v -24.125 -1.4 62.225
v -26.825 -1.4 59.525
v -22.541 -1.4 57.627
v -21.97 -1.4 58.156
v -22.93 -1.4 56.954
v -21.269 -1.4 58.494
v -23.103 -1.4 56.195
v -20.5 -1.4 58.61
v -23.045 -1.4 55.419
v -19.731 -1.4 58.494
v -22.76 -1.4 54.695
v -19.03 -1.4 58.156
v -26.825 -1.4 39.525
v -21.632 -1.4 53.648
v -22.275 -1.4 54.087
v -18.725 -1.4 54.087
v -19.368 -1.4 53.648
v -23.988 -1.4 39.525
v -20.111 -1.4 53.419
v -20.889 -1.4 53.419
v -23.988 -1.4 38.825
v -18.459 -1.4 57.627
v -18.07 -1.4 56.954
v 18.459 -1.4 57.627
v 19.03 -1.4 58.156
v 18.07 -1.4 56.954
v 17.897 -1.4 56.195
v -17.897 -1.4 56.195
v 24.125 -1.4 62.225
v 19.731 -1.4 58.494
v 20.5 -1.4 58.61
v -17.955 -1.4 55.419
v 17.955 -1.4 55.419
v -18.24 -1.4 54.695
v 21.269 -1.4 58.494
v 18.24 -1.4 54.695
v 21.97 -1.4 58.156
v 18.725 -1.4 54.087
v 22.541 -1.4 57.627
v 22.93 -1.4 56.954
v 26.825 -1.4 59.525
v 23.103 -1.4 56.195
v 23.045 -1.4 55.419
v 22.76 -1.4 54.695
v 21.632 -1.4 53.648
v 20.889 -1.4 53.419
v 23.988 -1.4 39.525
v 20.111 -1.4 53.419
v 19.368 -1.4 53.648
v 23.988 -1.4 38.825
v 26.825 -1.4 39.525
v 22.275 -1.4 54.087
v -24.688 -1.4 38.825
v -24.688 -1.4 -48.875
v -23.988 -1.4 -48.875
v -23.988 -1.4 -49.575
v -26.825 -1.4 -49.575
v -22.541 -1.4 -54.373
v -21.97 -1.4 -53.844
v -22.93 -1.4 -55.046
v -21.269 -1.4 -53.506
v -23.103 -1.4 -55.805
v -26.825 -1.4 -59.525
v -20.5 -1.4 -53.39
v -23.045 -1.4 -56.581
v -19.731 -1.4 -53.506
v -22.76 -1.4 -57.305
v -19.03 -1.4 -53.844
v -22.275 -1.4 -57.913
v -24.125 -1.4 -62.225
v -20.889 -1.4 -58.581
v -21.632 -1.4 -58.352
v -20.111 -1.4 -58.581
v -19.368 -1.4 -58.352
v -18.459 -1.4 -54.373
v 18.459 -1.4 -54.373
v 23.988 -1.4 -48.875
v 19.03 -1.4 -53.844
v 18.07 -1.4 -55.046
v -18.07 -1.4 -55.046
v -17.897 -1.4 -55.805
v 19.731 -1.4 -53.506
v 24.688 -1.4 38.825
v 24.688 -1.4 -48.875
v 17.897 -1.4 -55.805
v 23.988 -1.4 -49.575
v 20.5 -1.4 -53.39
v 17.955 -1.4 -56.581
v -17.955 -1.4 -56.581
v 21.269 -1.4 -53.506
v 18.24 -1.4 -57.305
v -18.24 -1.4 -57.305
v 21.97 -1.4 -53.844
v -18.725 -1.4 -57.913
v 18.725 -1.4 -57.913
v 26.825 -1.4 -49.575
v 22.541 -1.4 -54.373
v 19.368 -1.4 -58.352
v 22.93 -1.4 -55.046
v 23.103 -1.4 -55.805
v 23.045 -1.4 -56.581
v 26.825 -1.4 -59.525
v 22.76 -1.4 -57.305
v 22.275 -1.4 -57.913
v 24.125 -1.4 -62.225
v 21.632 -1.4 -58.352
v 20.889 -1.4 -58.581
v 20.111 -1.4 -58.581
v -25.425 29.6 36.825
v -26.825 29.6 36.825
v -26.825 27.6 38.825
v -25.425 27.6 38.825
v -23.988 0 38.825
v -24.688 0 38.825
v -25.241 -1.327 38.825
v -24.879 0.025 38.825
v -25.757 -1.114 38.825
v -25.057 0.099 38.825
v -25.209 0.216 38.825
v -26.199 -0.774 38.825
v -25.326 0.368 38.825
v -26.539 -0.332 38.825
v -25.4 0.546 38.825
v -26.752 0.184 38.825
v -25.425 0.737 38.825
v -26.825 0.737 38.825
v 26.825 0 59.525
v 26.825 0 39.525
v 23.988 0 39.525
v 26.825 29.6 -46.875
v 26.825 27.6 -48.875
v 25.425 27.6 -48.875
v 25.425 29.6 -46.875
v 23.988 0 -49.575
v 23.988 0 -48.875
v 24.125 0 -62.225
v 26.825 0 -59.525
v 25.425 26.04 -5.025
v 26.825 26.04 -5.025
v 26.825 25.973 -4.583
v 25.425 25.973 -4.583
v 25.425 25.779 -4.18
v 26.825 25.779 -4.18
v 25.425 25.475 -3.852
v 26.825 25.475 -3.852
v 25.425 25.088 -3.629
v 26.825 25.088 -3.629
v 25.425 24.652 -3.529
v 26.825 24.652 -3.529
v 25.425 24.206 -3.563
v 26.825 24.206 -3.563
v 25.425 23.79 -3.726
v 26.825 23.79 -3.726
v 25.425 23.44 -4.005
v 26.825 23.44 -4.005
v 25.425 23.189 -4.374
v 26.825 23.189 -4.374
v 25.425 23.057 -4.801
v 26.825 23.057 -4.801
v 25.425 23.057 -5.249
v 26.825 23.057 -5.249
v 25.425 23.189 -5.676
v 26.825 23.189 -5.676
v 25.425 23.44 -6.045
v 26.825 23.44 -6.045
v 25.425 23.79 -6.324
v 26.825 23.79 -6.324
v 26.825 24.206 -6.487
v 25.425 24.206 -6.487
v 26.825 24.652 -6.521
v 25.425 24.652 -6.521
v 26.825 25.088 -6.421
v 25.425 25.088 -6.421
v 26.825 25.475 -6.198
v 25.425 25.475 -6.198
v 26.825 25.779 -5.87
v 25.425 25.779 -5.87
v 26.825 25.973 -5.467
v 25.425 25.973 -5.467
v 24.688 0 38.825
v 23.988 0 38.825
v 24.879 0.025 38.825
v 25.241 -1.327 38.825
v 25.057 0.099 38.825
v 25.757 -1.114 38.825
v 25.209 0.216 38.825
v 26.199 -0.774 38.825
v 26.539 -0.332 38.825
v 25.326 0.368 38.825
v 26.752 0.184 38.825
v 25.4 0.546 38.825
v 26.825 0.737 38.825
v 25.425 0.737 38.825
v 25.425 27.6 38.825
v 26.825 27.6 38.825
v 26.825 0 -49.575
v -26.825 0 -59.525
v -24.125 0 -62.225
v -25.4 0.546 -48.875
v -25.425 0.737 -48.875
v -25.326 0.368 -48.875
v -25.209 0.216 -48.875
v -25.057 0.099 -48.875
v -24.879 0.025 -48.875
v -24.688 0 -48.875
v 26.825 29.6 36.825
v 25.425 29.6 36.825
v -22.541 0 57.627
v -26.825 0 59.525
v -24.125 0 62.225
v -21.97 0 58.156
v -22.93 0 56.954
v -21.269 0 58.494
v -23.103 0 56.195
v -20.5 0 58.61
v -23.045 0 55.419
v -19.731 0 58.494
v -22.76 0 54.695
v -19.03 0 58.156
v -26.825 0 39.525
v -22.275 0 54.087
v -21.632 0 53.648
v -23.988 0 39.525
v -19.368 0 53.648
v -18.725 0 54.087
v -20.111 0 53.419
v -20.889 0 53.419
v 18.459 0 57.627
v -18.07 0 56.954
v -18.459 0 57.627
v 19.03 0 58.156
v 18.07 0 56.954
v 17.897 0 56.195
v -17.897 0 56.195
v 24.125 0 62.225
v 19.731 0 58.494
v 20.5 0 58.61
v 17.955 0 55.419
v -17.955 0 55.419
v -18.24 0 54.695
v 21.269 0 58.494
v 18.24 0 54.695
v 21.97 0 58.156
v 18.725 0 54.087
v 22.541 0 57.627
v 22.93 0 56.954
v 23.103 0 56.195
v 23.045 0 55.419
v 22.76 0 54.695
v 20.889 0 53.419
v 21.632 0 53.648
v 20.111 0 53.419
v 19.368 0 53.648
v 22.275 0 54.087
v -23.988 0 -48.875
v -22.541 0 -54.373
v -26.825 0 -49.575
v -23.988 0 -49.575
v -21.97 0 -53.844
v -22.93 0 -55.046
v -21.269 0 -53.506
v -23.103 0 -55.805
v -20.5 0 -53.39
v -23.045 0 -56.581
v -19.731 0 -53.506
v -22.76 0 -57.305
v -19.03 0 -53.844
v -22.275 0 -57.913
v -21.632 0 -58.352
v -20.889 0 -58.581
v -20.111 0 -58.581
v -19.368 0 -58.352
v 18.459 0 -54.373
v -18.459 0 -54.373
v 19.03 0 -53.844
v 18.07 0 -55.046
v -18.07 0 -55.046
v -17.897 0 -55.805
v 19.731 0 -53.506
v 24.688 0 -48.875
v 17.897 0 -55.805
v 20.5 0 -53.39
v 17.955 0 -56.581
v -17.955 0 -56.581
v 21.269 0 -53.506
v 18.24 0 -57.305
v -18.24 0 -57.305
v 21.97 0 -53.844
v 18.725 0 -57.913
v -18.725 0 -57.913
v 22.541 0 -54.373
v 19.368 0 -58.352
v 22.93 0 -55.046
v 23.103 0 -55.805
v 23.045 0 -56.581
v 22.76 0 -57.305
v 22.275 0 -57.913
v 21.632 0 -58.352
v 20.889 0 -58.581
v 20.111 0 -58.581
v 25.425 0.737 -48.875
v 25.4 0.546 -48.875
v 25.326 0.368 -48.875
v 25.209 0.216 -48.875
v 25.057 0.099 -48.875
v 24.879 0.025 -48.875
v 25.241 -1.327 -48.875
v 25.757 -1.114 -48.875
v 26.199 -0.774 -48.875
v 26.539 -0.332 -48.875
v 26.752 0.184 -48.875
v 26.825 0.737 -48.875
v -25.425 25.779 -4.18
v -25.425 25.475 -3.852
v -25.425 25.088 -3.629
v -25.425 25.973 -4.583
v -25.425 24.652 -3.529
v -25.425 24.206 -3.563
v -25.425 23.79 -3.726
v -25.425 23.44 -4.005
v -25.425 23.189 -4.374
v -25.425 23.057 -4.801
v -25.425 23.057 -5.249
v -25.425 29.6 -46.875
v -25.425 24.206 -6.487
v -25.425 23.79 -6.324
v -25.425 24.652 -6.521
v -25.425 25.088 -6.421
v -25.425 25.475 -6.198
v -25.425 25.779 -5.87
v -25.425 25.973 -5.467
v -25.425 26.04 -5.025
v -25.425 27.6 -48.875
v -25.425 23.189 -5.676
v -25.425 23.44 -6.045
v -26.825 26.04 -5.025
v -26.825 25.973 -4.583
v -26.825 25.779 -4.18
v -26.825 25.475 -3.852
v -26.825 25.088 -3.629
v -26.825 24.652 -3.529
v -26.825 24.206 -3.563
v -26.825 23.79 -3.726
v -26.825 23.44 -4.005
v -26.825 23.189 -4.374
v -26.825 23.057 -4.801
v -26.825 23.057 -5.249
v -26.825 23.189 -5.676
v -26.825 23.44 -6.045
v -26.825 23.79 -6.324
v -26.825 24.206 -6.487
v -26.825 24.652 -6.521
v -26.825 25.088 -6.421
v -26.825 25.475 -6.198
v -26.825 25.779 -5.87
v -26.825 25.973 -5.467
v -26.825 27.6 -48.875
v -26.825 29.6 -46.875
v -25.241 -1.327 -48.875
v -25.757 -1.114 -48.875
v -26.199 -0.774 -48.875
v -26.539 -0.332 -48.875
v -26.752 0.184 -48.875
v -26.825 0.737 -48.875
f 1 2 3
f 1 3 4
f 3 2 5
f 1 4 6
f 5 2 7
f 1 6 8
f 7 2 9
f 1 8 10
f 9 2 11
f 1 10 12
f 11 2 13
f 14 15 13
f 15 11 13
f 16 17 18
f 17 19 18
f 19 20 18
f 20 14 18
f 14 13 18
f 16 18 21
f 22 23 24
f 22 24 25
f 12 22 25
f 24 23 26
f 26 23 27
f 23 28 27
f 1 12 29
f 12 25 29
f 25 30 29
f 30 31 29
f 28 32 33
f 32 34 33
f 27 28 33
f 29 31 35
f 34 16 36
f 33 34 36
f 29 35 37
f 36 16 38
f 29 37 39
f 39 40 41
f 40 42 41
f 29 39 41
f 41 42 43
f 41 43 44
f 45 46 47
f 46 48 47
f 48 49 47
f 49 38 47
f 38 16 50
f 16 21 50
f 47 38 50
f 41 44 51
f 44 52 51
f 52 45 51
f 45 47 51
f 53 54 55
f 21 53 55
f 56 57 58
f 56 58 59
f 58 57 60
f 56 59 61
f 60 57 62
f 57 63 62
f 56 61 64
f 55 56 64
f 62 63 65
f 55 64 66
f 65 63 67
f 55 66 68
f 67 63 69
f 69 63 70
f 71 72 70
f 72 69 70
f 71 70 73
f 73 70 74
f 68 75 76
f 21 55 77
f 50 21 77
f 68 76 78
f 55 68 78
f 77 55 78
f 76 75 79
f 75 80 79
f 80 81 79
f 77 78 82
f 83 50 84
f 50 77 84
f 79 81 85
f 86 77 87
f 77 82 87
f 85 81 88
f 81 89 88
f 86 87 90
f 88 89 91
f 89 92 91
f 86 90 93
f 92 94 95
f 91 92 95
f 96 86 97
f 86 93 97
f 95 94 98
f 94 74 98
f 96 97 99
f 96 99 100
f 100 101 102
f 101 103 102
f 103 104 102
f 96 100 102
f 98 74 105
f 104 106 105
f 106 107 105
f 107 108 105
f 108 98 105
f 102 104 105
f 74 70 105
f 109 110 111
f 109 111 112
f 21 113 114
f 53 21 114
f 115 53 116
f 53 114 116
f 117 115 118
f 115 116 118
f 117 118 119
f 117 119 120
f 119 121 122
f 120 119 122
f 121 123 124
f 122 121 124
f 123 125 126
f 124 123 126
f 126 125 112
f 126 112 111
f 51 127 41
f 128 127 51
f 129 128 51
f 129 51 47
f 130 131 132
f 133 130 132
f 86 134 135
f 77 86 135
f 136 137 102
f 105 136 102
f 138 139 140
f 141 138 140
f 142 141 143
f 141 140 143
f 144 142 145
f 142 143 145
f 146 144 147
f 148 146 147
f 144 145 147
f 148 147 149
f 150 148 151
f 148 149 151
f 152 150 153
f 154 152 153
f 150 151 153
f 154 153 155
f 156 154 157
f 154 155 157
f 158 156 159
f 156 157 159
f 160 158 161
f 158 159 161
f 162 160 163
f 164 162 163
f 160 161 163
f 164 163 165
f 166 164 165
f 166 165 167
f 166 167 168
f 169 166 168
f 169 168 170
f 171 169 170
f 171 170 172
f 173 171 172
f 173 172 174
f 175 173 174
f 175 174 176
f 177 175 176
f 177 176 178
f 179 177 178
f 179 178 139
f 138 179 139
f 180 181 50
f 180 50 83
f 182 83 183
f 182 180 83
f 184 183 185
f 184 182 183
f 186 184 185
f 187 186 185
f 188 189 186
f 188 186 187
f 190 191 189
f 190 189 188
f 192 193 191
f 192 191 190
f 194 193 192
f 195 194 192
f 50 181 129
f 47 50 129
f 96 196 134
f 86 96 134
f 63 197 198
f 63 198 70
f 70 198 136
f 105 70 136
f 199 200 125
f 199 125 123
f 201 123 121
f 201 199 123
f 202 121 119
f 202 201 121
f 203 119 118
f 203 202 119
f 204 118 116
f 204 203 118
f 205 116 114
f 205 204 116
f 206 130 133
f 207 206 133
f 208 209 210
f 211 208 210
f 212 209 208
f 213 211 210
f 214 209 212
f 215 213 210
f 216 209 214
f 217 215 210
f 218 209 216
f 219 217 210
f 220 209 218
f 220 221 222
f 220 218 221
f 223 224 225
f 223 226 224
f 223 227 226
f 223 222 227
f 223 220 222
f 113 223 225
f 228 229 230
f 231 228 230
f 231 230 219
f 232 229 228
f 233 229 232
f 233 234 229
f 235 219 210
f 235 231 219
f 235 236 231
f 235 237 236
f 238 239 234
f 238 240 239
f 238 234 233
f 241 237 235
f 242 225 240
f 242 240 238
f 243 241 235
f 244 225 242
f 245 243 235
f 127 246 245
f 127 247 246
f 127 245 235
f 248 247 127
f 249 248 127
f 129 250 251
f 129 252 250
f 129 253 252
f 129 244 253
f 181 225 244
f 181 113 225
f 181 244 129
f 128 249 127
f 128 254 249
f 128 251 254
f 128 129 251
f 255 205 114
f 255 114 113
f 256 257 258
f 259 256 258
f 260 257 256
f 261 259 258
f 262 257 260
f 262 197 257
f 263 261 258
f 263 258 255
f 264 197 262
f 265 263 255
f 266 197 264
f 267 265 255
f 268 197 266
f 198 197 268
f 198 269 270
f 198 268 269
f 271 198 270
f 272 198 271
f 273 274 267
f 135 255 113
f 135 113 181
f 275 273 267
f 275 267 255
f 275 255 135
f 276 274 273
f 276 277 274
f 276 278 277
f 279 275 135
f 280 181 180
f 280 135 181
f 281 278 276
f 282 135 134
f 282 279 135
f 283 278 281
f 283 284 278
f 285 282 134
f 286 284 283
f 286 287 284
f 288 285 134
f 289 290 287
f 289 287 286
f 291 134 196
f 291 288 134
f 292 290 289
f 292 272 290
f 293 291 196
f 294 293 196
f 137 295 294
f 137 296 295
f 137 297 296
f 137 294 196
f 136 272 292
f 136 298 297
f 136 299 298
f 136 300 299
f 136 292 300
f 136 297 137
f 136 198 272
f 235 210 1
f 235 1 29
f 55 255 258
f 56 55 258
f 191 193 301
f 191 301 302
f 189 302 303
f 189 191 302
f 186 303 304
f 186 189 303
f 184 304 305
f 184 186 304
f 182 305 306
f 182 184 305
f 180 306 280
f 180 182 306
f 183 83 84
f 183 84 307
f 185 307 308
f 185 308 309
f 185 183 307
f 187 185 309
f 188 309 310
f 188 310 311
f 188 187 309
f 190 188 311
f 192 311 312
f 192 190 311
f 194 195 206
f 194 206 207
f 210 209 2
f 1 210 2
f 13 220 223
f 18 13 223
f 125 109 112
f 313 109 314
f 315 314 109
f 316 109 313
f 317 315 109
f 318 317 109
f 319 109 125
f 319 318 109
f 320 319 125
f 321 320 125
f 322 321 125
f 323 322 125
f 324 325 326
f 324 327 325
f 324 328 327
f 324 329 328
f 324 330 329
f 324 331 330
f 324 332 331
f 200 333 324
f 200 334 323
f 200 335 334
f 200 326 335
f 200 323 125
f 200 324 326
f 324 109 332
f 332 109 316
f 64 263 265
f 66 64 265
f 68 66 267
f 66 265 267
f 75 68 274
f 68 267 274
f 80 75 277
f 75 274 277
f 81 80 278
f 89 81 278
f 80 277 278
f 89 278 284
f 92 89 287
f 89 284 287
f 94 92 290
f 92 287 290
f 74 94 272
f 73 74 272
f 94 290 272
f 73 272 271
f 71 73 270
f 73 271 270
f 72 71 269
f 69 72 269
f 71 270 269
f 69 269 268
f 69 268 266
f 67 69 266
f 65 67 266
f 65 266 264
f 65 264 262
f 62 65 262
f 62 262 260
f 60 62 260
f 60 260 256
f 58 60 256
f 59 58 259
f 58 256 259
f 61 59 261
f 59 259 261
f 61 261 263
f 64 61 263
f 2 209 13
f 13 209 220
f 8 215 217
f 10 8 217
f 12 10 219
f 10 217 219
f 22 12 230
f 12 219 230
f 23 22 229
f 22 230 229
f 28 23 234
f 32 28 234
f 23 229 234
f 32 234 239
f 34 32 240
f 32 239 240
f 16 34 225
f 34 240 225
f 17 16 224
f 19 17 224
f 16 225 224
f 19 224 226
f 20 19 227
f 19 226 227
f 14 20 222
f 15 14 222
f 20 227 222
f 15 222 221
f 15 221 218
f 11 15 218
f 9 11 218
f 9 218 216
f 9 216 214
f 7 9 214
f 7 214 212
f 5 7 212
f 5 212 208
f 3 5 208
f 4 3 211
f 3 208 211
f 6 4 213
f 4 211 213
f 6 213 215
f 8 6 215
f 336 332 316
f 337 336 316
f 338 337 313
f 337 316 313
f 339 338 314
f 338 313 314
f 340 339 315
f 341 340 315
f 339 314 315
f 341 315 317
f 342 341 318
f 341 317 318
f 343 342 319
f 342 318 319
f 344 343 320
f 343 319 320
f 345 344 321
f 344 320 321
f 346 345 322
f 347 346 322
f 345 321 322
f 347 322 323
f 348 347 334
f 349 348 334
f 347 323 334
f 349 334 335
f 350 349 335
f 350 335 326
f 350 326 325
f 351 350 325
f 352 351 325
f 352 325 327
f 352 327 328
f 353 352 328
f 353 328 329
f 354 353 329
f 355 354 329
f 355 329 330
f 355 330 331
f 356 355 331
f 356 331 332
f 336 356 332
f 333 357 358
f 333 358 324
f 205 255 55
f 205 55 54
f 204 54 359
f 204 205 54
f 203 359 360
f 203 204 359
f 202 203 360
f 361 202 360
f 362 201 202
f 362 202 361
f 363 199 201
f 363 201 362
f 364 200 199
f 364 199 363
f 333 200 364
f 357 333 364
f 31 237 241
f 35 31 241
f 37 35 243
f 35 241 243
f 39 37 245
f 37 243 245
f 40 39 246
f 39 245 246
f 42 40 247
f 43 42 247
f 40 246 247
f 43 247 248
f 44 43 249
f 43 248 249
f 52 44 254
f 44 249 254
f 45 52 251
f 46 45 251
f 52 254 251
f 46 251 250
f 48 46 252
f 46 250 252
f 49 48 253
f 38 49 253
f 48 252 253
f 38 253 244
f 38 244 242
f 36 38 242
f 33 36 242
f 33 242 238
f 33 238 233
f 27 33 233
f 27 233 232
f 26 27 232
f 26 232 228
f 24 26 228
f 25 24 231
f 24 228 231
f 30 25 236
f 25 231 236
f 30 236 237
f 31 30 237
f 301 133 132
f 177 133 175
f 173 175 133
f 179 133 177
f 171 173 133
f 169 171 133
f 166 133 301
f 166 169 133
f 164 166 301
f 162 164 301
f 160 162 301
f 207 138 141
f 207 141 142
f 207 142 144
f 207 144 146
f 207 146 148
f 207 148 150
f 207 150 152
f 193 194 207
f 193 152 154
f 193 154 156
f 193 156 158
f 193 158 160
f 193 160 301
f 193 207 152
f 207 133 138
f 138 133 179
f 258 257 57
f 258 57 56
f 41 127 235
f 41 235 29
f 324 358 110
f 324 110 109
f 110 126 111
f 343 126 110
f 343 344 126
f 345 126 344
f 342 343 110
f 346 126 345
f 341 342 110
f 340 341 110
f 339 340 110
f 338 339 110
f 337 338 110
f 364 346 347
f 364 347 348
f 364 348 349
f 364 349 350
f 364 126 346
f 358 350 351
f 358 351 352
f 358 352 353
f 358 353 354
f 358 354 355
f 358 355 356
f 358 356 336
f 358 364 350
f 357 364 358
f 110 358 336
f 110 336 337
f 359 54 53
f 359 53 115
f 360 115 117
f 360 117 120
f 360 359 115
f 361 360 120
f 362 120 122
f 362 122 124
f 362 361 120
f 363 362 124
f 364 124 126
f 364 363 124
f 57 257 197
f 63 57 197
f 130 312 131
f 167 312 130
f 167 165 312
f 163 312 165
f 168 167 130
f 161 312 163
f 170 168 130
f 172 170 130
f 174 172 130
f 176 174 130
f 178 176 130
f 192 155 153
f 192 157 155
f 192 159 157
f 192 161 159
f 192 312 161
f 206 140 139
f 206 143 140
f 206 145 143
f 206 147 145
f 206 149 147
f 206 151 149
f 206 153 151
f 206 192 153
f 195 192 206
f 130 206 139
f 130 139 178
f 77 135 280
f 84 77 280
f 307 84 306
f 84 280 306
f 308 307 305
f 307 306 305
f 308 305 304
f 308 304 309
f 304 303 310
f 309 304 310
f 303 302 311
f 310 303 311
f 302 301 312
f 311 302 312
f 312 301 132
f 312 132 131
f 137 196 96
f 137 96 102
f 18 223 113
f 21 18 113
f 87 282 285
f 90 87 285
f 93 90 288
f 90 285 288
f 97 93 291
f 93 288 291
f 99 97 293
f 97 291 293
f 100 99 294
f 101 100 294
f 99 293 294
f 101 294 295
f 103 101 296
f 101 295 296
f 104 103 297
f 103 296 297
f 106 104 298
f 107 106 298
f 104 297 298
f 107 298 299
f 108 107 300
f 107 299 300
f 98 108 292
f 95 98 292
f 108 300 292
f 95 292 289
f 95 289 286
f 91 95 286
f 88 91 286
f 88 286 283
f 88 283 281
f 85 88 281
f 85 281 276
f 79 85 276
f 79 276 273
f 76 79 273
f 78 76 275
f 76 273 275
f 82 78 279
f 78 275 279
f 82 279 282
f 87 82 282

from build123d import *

# Parameters (mm, degrees)
SKETCH1_W                       = 53.65
SKETCH1_H                       = 124.45
SKETCH1_R                       = 2.61
BASE_FLANGE1_DEPTH              = 1.4
CHAMFER1_SIZE                   = 2.7
EDGE_FLANGE2_STRIP_W            = 7.0732
EDGE_FLANGE2_STRIP_H            = 1.4
EDGE_FLANGE2_STRIP_CUT_DEPTH    = 87.7
EDGE_FLANGE2_RELIEF_W           = 7.7732
EDGE_FLANGE2_RELIEF_H           = 0.7
EDGE_FLANGE2_RELIEF_CUT_DEPTH   = 1.4
EDGE_FLANGE2_STRIP_2_W          = 7.0732
EDGE_FLANGE2_STRIP_2_H          = 1.4
EDGE_FLANGE2_STRIP_CUT_2_DEPTH  = 87.7
EDGE_FLANGE2_RELIEF_2_W         = 7.7732
EDGE_FLANGE2_RELIEF_2_H         = 0.7
EDGE_FLANGE2_RELIEF_CUT_2_DEPTH = 1.4
EDGE_FLANGE2_DEPTH              = 87.7
EDGE_FLANGE2_BEND_DEPTH         = 87.7
CHAMFER2_SIZE                   = 2
SKETCH18_R                      = 1.5
CUT_EXTRUDE1_DEPTH              = 88.329451647


# Sheet-metal steps are written as plain solids
with BuildPart() as part:
    # Sketch1 → Base-Flange1 (new body)
    with BuildSketch(Plane(origin=(0, 0, 0), x_dir=(1, 0, 0), z_dir=(0, 1, 0))):
        Rectangle(SKETCH1_W, SKETCH1_H)
        with Locations(Location((-20.5, 56, 0), (0, 0, 270))):
            Circle(SKETCH1_R, mode=Mode.SUBTRACT)
        with Locations(Location((20.5, 56, 0), (0, 0, 270))):
            Circle(SKETCH1_R, mode=Mode.SUBTRACT)
        with Locations(Location((20.5, -56, 0), (0, 0, 270))):
            Circle(SKETCH1_R, mode=Mode.SUBTRACT)
        with Locations(Location((-20.5, -56, 0), (0, 0, 270))):
            Circle(SKETCH1_R, mode=Mode.SUBTRACT)
    extrude(amount=-BASE_FLANGE1_DEPTH)

    # Chamfer1
    chamfer1_edges = [part.edges().sort_by_distance(p)[0] for p in [
        (26.825, -0.7, 62.225),
        (-26.825, -0.7, 62.225),
        (-26.825, -0.7, -62.225),
        (26.825, -0.7, -62.225),
    ]]
    chamfer(chamfer1_edges, length=CHAMFER1_SIZE)

    # Edge-Flange2 strip (across the edge) → Edge-Flange2 strip cut (cut)
    with BuildSketch(Plane(origin=(26.825, 0, 38.825), x_dir=(-1, 0, 0), z_dir=(0, 0, -1))):
        with Locations((-1.4, -0.7)):
            Rectangle(EDGE_FLANGE2_STRIP_W, EDGE_FLANGE2_STRIP_H)
    extrude(amount=EDGE_FLANGE2_STRIP_CUT_DEPTH, mode=Mode.SUBTRACT)

    # Edge-Flange2 relief (on the sheet) → Edge-Flange2 relief cut (cut)
    with BuildSketch(Plane(origin=(24.6884, 0, 38.825), x_dir=(-1, 0, 0), z_dir=(0, 1, 0))):
        with Locations((-3.1866, 0.35)):
            Rectangle(EDGE_FLANGE2_RELIEF_W, EDGE_FLANGE2_RELIEF_H)
        with Locations((-3.1866, -88.05)):
            Rectangle(EDGE_FLANGE2_RELIEF_W, EDGE_FLANGE2_RELIEF_H)
    extrude(amount=-EDGE_FLANGE2_RELIEF_CUT_DEPTH, mode=Mode.SUBTRACT)

    # Edge-Flange2 strip 2 (across the edge) → Edge-Flange2 strip cut 2 (cut)
    with BuildSketch(Plane(origin=(-26.825, 0, -48.875), x_dir=(1, 0, 0), z_dir=(0, 0, 1))):
        with Locations((-1.4, -0.7)):
            Rectangle(EDGE_FLANGE2_STRIP_2_W, EDGE_FLANGE2_STRIP_2_H)
    extrude(amount=EDGE_FLANGE2_STRIP_CUT_2_DEPTH, mode=Mode.SUBTRACT)

    # Edge-Flange2 relief 2 (on the sheet) → Edge-Flange2 relief cut 2 (cut)
    with BuildSketch(Plane(origin=(-24.6884, 0, -48.875), x_dir=(1, 0, 0), z_dir=(0, 1, 0))):
        with Locations((-3.1866, 0.35)):
            Rectangle(EDGE_FLANGE2_RELIEF_2_W, EDGE_FLANGE2_RELIEF_2_H)
        with Locations((-3.1866, -88.05)):
            Rectangle(EDGE_FLANGE2_RELIEF_2_W, EDGE_FLANGE2_RELIEF_2_H)
    extrude(amount=-EDGE_FLANGE2_RELIEF_CUT_2_DEPTH, mode=Mode.SUBTRACT)

    # Edge-Flange2 section (across the edge) → Edge-Flange2 (add)
    with BuildSketch(Plane(origin=(26.825, 0, 38.825), x_dir=(-1, 0, 0), z_dir=(0, 0, -1))):
        with BuildLine():
            Line((0, 0.7366), (0, 29.6))
            Line((0, 29.6), (1.4, 29.6))
            Line((1.4, 29.6), (1.4, 0.7366))
            ThreePointArc((1.4, 0.7366), (1.615745145, 0.215745145), (2.1366, 0))
            Line((2.1366, 0), (2.1366, -1.4))
            ThreePointArc((2.1366, -1.4), (0.625795651, -0.774204349), (0, 0.7366))
        make_face()
    extrude(amount=EDGE_FLANGE2_DEPTH)

    # Edge-Flange2 section 2 (across the edge) → Edge-Flange2 bend (add)
    with BuildSketch(Plane(origin=(-26.825, 0, -48.875), x_dir=(1, 0, 0), z_dir=(0, 0, 1))):
        with BuildLine():
            Line((0, 0.7366), (0, 29.6))
            Line((0, 29.6), (1.4, 29.6))
            Line((1.4, 29.6), (1.4, 0.7366))
            ThreePointArc((1.4, 0.7366), (1.615745145, 0.215745145), (2.1366, 0))
            Line((2.1366, 0), (2.1366, -1.4))
            ThreePointArc((2.1366, -1.4), (0.625795651, -0.774204349), (0, 0.7366))
        make_face()
    extrude(amount=EDGE_FLANGE2_BEND_DEPTH)

    # Chamfer2
    chamfer2_edges = [part.edges().sort_by_distance(p)[0] for p in [
        (26.125, 29.6, 38.825),
        (26.125, 29.6, -48.875),
        (-26.125, 29.6, -48.875),
        (-26.125, 29.6, 38.825),
    ]]
    chamfer(chamfer2_edges, length=CHAMFER2_SIZE)

    # Sketch18 → Cut-Extrude1 (cut, through all)
    with BuildSketch(Plane(origin=(26.825, 0, 0), x_dir=(0, 0, -1), z_dir=(1, 0, 0))):
        with Locations(Location((5.025, 24.54, 0), (0, 0, 90))):
            Circle(SKETCH18_R)
    extrude(amount=-CUT_EXTRUDE1_DEPTH, mode=Mode.SUBTRACT)


solid = part.part
